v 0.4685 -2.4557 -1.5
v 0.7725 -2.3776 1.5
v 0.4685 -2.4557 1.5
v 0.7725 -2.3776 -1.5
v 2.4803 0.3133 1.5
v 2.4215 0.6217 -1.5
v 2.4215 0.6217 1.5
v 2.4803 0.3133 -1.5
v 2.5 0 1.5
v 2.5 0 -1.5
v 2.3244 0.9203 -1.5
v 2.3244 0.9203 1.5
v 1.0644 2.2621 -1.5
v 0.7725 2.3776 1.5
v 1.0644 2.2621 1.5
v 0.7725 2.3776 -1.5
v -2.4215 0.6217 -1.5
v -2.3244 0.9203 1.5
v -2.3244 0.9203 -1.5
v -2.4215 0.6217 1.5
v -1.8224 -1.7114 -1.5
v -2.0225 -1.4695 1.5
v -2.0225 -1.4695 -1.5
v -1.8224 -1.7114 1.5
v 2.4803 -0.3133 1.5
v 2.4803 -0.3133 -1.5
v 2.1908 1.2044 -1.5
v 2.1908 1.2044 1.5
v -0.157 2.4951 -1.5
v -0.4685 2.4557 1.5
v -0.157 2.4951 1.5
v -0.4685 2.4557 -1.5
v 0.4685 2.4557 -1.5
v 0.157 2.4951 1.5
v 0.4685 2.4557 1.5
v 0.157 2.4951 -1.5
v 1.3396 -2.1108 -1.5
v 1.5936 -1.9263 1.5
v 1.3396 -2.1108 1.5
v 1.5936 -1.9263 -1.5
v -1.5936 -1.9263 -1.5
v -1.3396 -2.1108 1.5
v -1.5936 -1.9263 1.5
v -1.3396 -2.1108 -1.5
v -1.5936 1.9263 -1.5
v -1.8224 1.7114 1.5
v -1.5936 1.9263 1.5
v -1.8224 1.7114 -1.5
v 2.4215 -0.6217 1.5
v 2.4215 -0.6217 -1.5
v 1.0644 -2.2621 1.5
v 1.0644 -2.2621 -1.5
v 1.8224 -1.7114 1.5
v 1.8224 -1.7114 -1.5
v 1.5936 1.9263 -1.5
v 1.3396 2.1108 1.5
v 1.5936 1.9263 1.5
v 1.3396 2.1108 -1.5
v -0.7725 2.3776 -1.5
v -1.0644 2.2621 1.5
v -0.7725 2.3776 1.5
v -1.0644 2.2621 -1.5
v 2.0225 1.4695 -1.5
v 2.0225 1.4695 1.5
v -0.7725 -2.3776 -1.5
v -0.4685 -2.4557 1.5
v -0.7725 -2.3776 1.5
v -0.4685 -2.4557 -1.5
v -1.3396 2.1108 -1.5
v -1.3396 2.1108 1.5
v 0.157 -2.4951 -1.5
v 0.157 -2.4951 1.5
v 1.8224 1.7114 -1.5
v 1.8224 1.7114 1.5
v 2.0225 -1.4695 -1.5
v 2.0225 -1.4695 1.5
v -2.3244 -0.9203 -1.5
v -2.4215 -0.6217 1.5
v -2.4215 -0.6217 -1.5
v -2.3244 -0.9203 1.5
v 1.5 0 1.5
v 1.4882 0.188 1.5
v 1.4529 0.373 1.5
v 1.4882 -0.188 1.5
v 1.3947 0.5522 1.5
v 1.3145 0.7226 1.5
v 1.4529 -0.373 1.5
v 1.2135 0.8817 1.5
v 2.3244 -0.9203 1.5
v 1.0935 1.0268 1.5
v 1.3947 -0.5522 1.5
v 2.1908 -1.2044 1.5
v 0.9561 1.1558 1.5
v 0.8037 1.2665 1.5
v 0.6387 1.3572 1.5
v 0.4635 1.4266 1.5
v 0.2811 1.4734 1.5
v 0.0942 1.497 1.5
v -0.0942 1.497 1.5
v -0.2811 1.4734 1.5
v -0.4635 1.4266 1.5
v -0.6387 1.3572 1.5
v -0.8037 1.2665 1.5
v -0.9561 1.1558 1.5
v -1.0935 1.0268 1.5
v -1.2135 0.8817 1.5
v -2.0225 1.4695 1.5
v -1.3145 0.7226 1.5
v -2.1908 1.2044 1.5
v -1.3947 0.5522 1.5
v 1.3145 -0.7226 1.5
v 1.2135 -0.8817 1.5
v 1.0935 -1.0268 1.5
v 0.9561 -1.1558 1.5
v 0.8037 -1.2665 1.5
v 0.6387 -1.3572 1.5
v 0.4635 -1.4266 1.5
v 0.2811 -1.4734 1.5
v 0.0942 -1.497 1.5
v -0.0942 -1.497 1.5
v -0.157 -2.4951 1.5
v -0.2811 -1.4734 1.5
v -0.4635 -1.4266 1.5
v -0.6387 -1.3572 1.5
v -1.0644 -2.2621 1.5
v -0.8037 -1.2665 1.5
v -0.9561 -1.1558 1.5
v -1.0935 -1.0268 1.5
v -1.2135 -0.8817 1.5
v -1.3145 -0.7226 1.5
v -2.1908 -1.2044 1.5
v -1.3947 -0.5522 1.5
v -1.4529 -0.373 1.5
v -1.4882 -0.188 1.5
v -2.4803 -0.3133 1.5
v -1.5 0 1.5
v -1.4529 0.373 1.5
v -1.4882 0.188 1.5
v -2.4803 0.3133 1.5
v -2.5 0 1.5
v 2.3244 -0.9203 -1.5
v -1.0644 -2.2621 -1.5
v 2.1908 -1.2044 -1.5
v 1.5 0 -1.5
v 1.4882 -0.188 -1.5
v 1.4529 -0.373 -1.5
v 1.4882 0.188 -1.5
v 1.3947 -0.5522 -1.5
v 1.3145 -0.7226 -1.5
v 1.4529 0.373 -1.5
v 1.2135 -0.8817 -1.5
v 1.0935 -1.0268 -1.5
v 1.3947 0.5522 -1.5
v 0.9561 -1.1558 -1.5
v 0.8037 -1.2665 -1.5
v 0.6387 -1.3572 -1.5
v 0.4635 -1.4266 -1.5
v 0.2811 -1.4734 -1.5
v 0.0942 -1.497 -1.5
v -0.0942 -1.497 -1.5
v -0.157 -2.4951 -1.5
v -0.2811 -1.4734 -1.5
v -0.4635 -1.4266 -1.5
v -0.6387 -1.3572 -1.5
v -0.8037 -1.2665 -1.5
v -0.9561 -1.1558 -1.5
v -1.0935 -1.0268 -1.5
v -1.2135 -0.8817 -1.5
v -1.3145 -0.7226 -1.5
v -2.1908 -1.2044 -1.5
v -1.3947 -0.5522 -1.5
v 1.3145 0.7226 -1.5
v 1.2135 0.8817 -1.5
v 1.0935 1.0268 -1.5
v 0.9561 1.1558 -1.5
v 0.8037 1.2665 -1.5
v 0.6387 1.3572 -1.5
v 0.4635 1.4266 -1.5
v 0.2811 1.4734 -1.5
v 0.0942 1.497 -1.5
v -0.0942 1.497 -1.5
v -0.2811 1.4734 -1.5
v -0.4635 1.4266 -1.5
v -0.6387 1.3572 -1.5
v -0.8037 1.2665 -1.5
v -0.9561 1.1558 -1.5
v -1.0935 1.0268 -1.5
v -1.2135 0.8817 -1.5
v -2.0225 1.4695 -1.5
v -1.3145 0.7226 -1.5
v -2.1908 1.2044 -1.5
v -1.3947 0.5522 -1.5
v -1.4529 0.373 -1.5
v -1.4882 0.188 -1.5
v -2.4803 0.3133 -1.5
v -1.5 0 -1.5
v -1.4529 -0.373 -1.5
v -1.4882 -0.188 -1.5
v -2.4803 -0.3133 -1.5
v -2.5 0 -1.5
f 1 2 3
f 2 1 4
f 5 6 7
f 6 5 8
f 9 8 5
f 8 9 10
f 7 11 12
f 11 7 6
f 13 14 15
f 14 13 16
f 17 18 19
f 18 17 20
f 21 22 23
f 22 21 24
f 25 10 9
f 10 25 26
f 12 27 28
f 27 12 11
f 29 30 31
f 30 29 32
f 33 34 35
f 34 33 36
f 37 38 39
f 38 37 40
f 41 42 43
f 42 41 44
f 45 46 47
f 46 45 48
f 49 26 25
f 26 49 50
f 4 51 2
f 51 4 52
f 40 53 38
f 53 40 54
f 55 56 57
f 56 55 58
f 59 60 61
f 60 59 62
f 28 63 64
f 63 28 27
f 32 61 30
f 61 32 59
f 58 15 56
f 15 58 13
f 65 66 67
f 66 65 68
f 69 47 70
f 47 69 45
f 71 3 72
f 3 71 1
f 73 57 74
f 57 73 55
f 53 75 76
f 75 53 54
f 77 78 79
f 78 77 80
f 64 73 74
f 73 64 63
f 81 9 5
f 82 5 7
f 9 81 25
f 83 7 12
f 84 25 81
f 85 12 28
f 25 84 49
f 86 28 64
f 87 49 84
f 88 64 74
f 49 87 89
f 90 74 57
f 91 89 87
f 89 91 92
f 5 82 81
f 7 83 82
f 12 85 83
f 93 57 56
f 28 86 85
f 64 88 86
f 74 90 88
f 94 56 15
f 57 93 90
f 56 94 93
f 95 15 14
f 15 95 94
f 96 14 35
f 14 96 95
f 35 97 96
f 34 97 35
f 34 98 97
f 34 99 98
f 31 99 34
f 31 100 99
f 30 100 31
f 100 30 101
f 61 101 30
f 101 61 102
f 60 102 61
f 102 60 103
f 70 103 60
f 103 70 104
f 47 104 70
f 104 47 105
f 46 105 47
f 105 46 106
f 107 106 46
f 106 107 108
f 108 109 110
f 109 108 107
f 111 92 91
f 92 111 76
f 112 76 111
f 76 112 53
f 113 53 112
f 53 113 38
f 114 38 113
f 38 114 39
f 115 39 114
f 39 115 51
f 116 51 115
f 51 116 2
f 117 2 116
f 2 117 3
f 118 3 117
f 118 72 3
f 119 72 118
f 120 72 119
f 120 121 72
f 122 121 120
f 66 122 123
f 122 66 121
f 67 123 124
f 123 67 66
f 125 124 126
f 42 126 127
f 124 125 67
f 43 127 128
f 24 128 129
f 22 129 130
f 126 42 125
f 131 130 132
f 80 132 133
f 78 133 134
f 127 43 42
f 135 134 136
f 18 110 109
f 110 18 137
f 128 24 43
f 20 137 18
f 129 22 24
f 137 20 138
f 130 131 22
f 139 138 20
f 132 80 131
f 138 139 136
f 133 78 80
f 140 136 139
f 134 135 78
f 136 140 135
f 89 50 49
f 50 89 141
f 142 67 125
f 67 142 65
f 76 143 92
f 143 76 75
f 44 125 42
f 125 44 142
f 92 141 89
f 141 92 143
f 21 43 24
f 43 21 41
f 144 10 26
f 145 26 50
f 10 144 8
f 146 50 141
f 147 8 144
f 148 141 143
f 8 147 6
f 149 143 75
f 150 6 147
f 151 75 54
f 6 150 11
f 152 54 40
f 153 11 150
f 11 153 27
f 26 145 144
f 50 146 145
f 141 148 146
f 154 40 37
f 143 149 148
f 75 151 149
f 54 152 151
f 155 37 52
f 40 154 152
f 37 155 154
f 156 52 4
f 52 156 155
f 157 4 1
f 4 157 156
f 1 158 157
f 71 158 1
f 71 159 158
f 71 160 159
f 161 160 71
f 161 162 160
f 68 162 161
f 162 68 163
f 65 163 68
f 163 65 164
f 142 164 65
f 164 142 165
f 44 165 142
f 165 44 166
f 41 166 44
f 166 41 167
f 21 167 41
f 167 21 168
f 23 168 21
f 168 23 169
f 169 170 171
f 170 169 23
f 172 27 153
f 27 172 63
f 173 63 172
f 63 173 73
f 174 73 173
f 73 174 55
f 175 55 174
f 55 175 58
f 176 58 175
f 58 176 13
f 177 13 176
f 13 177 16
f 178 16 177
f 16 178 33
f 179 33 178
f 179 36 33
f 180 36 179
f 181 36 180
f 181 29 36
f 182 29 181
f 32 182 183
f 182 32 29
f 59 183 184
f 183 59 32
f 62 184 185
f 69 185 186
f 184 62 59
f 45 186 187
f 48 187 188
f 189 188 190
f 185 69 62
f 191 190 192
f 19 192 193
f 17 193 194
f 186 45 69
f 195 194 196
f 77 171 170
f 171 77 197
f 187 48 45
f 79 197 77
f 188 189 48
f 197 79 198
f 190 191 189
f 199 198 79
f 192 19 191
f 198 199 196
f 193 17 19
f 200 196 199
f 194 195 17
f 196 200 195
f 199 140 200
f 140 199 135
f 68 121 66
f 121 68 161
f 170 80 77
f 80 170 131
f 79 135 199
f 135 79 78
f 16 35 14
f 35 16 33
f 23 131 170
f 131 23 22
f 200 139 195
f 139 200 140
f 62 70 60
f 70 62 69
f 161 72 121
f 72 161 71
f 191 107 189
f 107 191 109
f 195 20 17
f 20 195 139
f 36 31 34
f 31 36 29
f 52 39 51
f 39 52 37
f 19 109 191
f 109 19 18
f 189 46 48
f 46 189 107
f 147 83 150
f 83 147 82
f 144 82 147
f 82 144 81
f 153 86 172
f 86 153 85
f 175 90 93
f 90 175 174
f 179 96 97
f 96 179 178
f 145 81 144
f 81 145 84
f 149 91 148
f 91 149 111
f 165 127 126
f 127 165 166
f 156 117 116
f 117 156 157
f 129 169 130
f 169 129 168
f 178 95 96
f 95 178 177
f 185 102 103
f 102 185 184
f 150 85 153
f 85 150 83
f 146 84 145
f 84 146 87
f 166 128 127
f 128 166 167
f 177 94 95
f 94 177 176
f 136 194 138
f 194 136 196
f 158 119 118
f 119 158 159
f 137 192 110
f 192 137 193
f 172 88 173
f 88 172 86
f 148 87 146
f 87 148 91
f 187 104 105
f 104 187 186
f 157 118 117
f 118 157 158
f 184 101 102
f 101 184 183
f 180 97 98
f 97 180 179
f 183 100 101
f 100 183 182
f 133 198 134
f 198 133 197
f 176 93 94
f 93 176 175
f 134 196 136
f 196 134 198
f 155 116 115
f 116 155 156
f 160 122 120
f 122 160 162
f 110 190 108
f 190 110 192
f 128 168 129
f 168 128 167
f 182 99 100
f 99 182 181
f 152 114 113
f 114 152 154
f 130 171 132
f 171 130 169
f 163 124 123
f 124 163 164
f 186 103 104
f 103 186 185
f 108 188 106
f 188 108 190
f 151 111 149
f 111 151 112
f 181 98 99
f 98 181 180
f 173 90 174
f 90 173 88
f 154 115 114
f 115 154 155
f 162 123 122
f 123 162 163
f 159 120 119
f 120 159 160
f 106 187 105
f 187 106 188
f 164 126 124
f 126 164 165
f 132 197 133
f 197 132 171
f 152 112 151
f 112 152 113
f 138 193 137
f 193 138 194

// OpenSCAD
$fn = 50;


difference() {
	union() {
		translate(v = [0, 0, -1.5000000000]) {
			cylinder(h = 3, r = 2.5000000000);
		}
	}
	union() {
		translate(v = [0, 0, -100.0000000000]) {
			cylinder(h = 200, r = 1.5000000000);
		}
	}
}
